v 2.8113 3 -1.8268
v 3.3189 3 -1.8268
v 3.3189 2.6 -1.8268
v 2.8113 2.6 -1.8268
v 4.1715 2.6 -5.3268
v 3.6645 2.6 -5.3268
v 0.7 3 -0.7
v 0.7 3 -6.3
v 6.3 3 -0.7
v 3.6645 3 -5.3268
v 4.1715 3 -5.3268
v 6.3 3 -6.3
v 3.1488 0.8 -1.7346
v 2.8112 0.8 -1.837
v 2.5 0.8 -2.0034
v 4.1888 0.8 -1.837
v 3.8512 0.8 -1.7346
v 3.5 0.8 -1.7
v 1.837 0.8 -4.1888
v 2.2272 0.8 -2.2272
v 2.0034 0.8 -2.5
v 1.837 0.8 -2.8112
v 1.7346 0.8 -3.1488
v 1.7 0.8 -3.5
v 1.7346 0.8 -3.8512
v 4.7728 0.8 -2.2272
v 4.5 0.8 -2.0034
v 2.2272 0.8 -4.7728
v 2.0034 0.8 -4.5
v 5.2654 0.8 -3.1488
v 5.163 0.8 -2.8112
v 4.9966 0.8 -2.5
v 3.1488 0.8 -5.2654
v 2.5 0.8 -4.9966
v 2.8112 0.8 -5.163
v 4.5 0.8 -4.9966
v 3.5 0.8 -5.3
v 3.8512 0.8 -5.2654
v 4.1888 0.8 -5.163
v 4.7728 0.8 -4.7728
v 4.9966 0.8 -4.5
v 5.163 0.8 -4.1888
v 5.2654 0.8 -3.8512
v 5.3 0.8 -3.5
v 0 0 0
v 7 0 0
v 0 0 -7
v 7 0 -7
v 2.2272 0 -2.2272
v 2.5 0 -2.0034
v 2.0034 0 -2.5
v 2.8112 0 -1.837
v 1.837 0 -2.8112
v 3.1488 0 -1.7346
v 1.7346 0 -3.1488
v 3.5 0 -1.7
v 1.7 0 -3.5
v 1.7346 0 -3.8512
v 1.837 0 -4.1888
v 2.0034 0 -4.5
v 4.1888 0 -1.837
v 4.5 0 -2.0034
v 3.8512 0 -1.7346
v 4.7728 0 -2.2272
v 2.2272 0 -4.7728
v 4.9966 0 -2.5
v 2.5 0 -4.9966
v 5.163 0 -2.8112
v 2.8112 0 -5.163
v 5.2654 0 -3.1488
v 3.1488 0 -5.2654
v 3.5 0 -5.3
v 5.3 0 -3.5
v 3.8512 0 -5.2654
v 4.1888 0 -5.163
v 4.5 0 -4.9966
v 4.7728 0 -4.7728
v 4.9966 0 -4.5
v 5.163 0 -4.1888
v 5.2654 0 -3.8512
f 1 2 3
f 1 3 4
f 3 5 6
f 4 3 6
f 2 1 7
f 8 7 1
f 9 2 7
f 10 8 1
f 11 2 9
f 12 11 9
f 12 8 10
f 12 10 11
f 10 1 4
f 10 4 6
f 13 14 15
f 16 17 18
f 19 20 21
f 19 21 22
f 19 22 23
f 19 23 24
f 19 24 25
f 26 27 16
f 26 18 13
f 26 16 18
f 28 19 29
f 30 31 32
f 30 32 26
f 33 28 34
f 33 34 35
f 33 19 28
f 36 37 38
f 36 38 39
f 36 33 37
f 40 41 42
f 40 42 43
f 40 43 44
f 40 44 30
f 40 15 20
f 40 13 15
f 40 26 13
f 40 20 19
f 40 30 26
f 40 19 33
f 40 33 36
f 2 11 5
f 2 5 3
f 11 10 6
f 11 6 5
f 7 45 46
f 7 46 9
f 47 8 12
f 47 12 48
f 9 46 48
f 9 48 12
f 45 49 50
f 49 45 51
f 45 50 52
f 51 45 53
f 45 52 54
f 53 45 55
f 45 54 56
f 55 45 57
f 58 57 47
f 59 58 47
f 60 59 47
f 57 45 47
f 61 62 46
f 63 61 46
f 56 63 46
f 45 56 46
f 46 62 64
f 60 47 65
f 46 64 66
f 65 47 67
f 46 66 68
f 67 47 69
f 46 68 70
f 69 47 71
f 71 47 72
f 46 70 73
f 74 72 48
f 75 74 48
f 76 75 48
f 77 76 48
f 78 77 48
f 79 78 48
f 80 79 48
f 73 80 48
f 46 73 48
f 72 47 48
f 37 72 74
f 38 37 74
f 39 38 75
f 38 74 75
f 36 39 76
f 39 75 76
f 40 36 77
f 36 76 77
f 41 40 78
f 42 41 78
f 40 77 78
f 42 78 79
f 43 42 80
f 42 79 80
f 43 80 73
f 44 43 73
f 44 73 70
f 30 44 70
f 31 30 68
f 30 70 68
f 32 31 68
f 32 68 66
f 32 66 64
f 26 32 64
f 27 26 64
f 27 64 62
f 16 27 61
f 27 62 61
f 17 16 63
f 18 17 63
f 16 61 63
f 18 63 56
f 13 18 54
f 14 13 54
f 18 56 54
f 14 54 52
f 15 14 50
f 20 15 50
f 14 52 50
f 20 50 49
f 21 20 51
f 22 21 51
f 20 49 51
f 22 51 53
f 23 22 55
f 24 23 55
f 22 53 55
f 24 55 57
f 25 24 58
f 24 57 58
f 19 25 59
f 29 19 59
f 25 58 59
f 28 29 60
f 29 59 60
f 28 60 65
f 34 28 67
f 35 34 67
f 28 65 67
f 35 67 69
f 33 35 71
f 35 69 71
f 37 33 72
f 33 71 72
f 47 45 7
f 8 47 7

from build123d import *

# Parameters (mm, degrees)
SKETCH1_W           = 7
SKETCH1_H           = 7
BOSS_EXTRUDE1_DEPTH = 3
CUT_EXTRUDE1_DEPTH  = 7
CUT_EXTRUDE2_DEPTH  = 11
SKETCH4_R           = 1.8
CUT_EXTRUDE3_DEPTH  = 0.8
CUT_EXTRUDE4_DEPTH  = 0.4


with BuildPart() as part:
    # Sketch1 → Boss-Extrude1 (new body)
    with BuildSketch(Plane(origin=(0, 0, 0), x_dir=(1, 0, 0), z_dir=(0, 1, 0))):
        with Locations((3.5, 3.5)):
            Rectangle(SKETCH1_W, SKETCH1_H)
    extrude(amount=BOSS_EXTRUDE1_DEPTH)

    # Sketch2 → Cut-Extrude1 (cut)
    with BuildSketch(Plane.XY):
        Polygon((0, 0), (0.7, 3), (0, 3), align=None)
        Polygon((7, 0), (6.3, 3), (7, 3), align=None)
    extrude(amount=-CUT_EXTRUDE1_DEPTH, mode=Mode.SUBTRACT)

    # Sketch3 → Cut-Extrude2 (cut)
    with BuildSketch(Plane(origin=(0, 0, 0), x_dir=(0, 0, -1), z_dir=(1, 0, 0))):
        Polygon((0, 0), (0.7, 3), (0, 3), align=None)
        Polygon((7, 3), (6.3, 3), (7, 0), align=None)
    extrude(amount=CUT_EXTRUDE2_DEPTH, mode=Mode.SUBTRACT)

    # Sketch4 → Cut-Extrude3 (cut)
    with BuildSketch(Plane.XZ):
        with Locations(Location((3.5, -3.5, 0), (0, 0, 270))):
            Circle(SKETCH4_R)
    extrude(amount=-CUT_EXTRUDE3_DEPTH, mode=Mode.SUBTRACT)

    # Sketch6 → Cut-Extrude4 (cut)
    with BuildSketch(Plane(origin=(0, 3, 0), x_dir=(1, 0, 0), z_dir=(0, 1, 0))):
        Polygon((2.811280801, 1.826752028), (3.664546025, 5.326752028), (4.171457083, 5.326752028), (3.318892981, 1.826752028), align=None)
    extrude(amount=-CUT_EXTRUDE4_DEPTH, mode=Mode.SUBTRACT)


solid = part.part
